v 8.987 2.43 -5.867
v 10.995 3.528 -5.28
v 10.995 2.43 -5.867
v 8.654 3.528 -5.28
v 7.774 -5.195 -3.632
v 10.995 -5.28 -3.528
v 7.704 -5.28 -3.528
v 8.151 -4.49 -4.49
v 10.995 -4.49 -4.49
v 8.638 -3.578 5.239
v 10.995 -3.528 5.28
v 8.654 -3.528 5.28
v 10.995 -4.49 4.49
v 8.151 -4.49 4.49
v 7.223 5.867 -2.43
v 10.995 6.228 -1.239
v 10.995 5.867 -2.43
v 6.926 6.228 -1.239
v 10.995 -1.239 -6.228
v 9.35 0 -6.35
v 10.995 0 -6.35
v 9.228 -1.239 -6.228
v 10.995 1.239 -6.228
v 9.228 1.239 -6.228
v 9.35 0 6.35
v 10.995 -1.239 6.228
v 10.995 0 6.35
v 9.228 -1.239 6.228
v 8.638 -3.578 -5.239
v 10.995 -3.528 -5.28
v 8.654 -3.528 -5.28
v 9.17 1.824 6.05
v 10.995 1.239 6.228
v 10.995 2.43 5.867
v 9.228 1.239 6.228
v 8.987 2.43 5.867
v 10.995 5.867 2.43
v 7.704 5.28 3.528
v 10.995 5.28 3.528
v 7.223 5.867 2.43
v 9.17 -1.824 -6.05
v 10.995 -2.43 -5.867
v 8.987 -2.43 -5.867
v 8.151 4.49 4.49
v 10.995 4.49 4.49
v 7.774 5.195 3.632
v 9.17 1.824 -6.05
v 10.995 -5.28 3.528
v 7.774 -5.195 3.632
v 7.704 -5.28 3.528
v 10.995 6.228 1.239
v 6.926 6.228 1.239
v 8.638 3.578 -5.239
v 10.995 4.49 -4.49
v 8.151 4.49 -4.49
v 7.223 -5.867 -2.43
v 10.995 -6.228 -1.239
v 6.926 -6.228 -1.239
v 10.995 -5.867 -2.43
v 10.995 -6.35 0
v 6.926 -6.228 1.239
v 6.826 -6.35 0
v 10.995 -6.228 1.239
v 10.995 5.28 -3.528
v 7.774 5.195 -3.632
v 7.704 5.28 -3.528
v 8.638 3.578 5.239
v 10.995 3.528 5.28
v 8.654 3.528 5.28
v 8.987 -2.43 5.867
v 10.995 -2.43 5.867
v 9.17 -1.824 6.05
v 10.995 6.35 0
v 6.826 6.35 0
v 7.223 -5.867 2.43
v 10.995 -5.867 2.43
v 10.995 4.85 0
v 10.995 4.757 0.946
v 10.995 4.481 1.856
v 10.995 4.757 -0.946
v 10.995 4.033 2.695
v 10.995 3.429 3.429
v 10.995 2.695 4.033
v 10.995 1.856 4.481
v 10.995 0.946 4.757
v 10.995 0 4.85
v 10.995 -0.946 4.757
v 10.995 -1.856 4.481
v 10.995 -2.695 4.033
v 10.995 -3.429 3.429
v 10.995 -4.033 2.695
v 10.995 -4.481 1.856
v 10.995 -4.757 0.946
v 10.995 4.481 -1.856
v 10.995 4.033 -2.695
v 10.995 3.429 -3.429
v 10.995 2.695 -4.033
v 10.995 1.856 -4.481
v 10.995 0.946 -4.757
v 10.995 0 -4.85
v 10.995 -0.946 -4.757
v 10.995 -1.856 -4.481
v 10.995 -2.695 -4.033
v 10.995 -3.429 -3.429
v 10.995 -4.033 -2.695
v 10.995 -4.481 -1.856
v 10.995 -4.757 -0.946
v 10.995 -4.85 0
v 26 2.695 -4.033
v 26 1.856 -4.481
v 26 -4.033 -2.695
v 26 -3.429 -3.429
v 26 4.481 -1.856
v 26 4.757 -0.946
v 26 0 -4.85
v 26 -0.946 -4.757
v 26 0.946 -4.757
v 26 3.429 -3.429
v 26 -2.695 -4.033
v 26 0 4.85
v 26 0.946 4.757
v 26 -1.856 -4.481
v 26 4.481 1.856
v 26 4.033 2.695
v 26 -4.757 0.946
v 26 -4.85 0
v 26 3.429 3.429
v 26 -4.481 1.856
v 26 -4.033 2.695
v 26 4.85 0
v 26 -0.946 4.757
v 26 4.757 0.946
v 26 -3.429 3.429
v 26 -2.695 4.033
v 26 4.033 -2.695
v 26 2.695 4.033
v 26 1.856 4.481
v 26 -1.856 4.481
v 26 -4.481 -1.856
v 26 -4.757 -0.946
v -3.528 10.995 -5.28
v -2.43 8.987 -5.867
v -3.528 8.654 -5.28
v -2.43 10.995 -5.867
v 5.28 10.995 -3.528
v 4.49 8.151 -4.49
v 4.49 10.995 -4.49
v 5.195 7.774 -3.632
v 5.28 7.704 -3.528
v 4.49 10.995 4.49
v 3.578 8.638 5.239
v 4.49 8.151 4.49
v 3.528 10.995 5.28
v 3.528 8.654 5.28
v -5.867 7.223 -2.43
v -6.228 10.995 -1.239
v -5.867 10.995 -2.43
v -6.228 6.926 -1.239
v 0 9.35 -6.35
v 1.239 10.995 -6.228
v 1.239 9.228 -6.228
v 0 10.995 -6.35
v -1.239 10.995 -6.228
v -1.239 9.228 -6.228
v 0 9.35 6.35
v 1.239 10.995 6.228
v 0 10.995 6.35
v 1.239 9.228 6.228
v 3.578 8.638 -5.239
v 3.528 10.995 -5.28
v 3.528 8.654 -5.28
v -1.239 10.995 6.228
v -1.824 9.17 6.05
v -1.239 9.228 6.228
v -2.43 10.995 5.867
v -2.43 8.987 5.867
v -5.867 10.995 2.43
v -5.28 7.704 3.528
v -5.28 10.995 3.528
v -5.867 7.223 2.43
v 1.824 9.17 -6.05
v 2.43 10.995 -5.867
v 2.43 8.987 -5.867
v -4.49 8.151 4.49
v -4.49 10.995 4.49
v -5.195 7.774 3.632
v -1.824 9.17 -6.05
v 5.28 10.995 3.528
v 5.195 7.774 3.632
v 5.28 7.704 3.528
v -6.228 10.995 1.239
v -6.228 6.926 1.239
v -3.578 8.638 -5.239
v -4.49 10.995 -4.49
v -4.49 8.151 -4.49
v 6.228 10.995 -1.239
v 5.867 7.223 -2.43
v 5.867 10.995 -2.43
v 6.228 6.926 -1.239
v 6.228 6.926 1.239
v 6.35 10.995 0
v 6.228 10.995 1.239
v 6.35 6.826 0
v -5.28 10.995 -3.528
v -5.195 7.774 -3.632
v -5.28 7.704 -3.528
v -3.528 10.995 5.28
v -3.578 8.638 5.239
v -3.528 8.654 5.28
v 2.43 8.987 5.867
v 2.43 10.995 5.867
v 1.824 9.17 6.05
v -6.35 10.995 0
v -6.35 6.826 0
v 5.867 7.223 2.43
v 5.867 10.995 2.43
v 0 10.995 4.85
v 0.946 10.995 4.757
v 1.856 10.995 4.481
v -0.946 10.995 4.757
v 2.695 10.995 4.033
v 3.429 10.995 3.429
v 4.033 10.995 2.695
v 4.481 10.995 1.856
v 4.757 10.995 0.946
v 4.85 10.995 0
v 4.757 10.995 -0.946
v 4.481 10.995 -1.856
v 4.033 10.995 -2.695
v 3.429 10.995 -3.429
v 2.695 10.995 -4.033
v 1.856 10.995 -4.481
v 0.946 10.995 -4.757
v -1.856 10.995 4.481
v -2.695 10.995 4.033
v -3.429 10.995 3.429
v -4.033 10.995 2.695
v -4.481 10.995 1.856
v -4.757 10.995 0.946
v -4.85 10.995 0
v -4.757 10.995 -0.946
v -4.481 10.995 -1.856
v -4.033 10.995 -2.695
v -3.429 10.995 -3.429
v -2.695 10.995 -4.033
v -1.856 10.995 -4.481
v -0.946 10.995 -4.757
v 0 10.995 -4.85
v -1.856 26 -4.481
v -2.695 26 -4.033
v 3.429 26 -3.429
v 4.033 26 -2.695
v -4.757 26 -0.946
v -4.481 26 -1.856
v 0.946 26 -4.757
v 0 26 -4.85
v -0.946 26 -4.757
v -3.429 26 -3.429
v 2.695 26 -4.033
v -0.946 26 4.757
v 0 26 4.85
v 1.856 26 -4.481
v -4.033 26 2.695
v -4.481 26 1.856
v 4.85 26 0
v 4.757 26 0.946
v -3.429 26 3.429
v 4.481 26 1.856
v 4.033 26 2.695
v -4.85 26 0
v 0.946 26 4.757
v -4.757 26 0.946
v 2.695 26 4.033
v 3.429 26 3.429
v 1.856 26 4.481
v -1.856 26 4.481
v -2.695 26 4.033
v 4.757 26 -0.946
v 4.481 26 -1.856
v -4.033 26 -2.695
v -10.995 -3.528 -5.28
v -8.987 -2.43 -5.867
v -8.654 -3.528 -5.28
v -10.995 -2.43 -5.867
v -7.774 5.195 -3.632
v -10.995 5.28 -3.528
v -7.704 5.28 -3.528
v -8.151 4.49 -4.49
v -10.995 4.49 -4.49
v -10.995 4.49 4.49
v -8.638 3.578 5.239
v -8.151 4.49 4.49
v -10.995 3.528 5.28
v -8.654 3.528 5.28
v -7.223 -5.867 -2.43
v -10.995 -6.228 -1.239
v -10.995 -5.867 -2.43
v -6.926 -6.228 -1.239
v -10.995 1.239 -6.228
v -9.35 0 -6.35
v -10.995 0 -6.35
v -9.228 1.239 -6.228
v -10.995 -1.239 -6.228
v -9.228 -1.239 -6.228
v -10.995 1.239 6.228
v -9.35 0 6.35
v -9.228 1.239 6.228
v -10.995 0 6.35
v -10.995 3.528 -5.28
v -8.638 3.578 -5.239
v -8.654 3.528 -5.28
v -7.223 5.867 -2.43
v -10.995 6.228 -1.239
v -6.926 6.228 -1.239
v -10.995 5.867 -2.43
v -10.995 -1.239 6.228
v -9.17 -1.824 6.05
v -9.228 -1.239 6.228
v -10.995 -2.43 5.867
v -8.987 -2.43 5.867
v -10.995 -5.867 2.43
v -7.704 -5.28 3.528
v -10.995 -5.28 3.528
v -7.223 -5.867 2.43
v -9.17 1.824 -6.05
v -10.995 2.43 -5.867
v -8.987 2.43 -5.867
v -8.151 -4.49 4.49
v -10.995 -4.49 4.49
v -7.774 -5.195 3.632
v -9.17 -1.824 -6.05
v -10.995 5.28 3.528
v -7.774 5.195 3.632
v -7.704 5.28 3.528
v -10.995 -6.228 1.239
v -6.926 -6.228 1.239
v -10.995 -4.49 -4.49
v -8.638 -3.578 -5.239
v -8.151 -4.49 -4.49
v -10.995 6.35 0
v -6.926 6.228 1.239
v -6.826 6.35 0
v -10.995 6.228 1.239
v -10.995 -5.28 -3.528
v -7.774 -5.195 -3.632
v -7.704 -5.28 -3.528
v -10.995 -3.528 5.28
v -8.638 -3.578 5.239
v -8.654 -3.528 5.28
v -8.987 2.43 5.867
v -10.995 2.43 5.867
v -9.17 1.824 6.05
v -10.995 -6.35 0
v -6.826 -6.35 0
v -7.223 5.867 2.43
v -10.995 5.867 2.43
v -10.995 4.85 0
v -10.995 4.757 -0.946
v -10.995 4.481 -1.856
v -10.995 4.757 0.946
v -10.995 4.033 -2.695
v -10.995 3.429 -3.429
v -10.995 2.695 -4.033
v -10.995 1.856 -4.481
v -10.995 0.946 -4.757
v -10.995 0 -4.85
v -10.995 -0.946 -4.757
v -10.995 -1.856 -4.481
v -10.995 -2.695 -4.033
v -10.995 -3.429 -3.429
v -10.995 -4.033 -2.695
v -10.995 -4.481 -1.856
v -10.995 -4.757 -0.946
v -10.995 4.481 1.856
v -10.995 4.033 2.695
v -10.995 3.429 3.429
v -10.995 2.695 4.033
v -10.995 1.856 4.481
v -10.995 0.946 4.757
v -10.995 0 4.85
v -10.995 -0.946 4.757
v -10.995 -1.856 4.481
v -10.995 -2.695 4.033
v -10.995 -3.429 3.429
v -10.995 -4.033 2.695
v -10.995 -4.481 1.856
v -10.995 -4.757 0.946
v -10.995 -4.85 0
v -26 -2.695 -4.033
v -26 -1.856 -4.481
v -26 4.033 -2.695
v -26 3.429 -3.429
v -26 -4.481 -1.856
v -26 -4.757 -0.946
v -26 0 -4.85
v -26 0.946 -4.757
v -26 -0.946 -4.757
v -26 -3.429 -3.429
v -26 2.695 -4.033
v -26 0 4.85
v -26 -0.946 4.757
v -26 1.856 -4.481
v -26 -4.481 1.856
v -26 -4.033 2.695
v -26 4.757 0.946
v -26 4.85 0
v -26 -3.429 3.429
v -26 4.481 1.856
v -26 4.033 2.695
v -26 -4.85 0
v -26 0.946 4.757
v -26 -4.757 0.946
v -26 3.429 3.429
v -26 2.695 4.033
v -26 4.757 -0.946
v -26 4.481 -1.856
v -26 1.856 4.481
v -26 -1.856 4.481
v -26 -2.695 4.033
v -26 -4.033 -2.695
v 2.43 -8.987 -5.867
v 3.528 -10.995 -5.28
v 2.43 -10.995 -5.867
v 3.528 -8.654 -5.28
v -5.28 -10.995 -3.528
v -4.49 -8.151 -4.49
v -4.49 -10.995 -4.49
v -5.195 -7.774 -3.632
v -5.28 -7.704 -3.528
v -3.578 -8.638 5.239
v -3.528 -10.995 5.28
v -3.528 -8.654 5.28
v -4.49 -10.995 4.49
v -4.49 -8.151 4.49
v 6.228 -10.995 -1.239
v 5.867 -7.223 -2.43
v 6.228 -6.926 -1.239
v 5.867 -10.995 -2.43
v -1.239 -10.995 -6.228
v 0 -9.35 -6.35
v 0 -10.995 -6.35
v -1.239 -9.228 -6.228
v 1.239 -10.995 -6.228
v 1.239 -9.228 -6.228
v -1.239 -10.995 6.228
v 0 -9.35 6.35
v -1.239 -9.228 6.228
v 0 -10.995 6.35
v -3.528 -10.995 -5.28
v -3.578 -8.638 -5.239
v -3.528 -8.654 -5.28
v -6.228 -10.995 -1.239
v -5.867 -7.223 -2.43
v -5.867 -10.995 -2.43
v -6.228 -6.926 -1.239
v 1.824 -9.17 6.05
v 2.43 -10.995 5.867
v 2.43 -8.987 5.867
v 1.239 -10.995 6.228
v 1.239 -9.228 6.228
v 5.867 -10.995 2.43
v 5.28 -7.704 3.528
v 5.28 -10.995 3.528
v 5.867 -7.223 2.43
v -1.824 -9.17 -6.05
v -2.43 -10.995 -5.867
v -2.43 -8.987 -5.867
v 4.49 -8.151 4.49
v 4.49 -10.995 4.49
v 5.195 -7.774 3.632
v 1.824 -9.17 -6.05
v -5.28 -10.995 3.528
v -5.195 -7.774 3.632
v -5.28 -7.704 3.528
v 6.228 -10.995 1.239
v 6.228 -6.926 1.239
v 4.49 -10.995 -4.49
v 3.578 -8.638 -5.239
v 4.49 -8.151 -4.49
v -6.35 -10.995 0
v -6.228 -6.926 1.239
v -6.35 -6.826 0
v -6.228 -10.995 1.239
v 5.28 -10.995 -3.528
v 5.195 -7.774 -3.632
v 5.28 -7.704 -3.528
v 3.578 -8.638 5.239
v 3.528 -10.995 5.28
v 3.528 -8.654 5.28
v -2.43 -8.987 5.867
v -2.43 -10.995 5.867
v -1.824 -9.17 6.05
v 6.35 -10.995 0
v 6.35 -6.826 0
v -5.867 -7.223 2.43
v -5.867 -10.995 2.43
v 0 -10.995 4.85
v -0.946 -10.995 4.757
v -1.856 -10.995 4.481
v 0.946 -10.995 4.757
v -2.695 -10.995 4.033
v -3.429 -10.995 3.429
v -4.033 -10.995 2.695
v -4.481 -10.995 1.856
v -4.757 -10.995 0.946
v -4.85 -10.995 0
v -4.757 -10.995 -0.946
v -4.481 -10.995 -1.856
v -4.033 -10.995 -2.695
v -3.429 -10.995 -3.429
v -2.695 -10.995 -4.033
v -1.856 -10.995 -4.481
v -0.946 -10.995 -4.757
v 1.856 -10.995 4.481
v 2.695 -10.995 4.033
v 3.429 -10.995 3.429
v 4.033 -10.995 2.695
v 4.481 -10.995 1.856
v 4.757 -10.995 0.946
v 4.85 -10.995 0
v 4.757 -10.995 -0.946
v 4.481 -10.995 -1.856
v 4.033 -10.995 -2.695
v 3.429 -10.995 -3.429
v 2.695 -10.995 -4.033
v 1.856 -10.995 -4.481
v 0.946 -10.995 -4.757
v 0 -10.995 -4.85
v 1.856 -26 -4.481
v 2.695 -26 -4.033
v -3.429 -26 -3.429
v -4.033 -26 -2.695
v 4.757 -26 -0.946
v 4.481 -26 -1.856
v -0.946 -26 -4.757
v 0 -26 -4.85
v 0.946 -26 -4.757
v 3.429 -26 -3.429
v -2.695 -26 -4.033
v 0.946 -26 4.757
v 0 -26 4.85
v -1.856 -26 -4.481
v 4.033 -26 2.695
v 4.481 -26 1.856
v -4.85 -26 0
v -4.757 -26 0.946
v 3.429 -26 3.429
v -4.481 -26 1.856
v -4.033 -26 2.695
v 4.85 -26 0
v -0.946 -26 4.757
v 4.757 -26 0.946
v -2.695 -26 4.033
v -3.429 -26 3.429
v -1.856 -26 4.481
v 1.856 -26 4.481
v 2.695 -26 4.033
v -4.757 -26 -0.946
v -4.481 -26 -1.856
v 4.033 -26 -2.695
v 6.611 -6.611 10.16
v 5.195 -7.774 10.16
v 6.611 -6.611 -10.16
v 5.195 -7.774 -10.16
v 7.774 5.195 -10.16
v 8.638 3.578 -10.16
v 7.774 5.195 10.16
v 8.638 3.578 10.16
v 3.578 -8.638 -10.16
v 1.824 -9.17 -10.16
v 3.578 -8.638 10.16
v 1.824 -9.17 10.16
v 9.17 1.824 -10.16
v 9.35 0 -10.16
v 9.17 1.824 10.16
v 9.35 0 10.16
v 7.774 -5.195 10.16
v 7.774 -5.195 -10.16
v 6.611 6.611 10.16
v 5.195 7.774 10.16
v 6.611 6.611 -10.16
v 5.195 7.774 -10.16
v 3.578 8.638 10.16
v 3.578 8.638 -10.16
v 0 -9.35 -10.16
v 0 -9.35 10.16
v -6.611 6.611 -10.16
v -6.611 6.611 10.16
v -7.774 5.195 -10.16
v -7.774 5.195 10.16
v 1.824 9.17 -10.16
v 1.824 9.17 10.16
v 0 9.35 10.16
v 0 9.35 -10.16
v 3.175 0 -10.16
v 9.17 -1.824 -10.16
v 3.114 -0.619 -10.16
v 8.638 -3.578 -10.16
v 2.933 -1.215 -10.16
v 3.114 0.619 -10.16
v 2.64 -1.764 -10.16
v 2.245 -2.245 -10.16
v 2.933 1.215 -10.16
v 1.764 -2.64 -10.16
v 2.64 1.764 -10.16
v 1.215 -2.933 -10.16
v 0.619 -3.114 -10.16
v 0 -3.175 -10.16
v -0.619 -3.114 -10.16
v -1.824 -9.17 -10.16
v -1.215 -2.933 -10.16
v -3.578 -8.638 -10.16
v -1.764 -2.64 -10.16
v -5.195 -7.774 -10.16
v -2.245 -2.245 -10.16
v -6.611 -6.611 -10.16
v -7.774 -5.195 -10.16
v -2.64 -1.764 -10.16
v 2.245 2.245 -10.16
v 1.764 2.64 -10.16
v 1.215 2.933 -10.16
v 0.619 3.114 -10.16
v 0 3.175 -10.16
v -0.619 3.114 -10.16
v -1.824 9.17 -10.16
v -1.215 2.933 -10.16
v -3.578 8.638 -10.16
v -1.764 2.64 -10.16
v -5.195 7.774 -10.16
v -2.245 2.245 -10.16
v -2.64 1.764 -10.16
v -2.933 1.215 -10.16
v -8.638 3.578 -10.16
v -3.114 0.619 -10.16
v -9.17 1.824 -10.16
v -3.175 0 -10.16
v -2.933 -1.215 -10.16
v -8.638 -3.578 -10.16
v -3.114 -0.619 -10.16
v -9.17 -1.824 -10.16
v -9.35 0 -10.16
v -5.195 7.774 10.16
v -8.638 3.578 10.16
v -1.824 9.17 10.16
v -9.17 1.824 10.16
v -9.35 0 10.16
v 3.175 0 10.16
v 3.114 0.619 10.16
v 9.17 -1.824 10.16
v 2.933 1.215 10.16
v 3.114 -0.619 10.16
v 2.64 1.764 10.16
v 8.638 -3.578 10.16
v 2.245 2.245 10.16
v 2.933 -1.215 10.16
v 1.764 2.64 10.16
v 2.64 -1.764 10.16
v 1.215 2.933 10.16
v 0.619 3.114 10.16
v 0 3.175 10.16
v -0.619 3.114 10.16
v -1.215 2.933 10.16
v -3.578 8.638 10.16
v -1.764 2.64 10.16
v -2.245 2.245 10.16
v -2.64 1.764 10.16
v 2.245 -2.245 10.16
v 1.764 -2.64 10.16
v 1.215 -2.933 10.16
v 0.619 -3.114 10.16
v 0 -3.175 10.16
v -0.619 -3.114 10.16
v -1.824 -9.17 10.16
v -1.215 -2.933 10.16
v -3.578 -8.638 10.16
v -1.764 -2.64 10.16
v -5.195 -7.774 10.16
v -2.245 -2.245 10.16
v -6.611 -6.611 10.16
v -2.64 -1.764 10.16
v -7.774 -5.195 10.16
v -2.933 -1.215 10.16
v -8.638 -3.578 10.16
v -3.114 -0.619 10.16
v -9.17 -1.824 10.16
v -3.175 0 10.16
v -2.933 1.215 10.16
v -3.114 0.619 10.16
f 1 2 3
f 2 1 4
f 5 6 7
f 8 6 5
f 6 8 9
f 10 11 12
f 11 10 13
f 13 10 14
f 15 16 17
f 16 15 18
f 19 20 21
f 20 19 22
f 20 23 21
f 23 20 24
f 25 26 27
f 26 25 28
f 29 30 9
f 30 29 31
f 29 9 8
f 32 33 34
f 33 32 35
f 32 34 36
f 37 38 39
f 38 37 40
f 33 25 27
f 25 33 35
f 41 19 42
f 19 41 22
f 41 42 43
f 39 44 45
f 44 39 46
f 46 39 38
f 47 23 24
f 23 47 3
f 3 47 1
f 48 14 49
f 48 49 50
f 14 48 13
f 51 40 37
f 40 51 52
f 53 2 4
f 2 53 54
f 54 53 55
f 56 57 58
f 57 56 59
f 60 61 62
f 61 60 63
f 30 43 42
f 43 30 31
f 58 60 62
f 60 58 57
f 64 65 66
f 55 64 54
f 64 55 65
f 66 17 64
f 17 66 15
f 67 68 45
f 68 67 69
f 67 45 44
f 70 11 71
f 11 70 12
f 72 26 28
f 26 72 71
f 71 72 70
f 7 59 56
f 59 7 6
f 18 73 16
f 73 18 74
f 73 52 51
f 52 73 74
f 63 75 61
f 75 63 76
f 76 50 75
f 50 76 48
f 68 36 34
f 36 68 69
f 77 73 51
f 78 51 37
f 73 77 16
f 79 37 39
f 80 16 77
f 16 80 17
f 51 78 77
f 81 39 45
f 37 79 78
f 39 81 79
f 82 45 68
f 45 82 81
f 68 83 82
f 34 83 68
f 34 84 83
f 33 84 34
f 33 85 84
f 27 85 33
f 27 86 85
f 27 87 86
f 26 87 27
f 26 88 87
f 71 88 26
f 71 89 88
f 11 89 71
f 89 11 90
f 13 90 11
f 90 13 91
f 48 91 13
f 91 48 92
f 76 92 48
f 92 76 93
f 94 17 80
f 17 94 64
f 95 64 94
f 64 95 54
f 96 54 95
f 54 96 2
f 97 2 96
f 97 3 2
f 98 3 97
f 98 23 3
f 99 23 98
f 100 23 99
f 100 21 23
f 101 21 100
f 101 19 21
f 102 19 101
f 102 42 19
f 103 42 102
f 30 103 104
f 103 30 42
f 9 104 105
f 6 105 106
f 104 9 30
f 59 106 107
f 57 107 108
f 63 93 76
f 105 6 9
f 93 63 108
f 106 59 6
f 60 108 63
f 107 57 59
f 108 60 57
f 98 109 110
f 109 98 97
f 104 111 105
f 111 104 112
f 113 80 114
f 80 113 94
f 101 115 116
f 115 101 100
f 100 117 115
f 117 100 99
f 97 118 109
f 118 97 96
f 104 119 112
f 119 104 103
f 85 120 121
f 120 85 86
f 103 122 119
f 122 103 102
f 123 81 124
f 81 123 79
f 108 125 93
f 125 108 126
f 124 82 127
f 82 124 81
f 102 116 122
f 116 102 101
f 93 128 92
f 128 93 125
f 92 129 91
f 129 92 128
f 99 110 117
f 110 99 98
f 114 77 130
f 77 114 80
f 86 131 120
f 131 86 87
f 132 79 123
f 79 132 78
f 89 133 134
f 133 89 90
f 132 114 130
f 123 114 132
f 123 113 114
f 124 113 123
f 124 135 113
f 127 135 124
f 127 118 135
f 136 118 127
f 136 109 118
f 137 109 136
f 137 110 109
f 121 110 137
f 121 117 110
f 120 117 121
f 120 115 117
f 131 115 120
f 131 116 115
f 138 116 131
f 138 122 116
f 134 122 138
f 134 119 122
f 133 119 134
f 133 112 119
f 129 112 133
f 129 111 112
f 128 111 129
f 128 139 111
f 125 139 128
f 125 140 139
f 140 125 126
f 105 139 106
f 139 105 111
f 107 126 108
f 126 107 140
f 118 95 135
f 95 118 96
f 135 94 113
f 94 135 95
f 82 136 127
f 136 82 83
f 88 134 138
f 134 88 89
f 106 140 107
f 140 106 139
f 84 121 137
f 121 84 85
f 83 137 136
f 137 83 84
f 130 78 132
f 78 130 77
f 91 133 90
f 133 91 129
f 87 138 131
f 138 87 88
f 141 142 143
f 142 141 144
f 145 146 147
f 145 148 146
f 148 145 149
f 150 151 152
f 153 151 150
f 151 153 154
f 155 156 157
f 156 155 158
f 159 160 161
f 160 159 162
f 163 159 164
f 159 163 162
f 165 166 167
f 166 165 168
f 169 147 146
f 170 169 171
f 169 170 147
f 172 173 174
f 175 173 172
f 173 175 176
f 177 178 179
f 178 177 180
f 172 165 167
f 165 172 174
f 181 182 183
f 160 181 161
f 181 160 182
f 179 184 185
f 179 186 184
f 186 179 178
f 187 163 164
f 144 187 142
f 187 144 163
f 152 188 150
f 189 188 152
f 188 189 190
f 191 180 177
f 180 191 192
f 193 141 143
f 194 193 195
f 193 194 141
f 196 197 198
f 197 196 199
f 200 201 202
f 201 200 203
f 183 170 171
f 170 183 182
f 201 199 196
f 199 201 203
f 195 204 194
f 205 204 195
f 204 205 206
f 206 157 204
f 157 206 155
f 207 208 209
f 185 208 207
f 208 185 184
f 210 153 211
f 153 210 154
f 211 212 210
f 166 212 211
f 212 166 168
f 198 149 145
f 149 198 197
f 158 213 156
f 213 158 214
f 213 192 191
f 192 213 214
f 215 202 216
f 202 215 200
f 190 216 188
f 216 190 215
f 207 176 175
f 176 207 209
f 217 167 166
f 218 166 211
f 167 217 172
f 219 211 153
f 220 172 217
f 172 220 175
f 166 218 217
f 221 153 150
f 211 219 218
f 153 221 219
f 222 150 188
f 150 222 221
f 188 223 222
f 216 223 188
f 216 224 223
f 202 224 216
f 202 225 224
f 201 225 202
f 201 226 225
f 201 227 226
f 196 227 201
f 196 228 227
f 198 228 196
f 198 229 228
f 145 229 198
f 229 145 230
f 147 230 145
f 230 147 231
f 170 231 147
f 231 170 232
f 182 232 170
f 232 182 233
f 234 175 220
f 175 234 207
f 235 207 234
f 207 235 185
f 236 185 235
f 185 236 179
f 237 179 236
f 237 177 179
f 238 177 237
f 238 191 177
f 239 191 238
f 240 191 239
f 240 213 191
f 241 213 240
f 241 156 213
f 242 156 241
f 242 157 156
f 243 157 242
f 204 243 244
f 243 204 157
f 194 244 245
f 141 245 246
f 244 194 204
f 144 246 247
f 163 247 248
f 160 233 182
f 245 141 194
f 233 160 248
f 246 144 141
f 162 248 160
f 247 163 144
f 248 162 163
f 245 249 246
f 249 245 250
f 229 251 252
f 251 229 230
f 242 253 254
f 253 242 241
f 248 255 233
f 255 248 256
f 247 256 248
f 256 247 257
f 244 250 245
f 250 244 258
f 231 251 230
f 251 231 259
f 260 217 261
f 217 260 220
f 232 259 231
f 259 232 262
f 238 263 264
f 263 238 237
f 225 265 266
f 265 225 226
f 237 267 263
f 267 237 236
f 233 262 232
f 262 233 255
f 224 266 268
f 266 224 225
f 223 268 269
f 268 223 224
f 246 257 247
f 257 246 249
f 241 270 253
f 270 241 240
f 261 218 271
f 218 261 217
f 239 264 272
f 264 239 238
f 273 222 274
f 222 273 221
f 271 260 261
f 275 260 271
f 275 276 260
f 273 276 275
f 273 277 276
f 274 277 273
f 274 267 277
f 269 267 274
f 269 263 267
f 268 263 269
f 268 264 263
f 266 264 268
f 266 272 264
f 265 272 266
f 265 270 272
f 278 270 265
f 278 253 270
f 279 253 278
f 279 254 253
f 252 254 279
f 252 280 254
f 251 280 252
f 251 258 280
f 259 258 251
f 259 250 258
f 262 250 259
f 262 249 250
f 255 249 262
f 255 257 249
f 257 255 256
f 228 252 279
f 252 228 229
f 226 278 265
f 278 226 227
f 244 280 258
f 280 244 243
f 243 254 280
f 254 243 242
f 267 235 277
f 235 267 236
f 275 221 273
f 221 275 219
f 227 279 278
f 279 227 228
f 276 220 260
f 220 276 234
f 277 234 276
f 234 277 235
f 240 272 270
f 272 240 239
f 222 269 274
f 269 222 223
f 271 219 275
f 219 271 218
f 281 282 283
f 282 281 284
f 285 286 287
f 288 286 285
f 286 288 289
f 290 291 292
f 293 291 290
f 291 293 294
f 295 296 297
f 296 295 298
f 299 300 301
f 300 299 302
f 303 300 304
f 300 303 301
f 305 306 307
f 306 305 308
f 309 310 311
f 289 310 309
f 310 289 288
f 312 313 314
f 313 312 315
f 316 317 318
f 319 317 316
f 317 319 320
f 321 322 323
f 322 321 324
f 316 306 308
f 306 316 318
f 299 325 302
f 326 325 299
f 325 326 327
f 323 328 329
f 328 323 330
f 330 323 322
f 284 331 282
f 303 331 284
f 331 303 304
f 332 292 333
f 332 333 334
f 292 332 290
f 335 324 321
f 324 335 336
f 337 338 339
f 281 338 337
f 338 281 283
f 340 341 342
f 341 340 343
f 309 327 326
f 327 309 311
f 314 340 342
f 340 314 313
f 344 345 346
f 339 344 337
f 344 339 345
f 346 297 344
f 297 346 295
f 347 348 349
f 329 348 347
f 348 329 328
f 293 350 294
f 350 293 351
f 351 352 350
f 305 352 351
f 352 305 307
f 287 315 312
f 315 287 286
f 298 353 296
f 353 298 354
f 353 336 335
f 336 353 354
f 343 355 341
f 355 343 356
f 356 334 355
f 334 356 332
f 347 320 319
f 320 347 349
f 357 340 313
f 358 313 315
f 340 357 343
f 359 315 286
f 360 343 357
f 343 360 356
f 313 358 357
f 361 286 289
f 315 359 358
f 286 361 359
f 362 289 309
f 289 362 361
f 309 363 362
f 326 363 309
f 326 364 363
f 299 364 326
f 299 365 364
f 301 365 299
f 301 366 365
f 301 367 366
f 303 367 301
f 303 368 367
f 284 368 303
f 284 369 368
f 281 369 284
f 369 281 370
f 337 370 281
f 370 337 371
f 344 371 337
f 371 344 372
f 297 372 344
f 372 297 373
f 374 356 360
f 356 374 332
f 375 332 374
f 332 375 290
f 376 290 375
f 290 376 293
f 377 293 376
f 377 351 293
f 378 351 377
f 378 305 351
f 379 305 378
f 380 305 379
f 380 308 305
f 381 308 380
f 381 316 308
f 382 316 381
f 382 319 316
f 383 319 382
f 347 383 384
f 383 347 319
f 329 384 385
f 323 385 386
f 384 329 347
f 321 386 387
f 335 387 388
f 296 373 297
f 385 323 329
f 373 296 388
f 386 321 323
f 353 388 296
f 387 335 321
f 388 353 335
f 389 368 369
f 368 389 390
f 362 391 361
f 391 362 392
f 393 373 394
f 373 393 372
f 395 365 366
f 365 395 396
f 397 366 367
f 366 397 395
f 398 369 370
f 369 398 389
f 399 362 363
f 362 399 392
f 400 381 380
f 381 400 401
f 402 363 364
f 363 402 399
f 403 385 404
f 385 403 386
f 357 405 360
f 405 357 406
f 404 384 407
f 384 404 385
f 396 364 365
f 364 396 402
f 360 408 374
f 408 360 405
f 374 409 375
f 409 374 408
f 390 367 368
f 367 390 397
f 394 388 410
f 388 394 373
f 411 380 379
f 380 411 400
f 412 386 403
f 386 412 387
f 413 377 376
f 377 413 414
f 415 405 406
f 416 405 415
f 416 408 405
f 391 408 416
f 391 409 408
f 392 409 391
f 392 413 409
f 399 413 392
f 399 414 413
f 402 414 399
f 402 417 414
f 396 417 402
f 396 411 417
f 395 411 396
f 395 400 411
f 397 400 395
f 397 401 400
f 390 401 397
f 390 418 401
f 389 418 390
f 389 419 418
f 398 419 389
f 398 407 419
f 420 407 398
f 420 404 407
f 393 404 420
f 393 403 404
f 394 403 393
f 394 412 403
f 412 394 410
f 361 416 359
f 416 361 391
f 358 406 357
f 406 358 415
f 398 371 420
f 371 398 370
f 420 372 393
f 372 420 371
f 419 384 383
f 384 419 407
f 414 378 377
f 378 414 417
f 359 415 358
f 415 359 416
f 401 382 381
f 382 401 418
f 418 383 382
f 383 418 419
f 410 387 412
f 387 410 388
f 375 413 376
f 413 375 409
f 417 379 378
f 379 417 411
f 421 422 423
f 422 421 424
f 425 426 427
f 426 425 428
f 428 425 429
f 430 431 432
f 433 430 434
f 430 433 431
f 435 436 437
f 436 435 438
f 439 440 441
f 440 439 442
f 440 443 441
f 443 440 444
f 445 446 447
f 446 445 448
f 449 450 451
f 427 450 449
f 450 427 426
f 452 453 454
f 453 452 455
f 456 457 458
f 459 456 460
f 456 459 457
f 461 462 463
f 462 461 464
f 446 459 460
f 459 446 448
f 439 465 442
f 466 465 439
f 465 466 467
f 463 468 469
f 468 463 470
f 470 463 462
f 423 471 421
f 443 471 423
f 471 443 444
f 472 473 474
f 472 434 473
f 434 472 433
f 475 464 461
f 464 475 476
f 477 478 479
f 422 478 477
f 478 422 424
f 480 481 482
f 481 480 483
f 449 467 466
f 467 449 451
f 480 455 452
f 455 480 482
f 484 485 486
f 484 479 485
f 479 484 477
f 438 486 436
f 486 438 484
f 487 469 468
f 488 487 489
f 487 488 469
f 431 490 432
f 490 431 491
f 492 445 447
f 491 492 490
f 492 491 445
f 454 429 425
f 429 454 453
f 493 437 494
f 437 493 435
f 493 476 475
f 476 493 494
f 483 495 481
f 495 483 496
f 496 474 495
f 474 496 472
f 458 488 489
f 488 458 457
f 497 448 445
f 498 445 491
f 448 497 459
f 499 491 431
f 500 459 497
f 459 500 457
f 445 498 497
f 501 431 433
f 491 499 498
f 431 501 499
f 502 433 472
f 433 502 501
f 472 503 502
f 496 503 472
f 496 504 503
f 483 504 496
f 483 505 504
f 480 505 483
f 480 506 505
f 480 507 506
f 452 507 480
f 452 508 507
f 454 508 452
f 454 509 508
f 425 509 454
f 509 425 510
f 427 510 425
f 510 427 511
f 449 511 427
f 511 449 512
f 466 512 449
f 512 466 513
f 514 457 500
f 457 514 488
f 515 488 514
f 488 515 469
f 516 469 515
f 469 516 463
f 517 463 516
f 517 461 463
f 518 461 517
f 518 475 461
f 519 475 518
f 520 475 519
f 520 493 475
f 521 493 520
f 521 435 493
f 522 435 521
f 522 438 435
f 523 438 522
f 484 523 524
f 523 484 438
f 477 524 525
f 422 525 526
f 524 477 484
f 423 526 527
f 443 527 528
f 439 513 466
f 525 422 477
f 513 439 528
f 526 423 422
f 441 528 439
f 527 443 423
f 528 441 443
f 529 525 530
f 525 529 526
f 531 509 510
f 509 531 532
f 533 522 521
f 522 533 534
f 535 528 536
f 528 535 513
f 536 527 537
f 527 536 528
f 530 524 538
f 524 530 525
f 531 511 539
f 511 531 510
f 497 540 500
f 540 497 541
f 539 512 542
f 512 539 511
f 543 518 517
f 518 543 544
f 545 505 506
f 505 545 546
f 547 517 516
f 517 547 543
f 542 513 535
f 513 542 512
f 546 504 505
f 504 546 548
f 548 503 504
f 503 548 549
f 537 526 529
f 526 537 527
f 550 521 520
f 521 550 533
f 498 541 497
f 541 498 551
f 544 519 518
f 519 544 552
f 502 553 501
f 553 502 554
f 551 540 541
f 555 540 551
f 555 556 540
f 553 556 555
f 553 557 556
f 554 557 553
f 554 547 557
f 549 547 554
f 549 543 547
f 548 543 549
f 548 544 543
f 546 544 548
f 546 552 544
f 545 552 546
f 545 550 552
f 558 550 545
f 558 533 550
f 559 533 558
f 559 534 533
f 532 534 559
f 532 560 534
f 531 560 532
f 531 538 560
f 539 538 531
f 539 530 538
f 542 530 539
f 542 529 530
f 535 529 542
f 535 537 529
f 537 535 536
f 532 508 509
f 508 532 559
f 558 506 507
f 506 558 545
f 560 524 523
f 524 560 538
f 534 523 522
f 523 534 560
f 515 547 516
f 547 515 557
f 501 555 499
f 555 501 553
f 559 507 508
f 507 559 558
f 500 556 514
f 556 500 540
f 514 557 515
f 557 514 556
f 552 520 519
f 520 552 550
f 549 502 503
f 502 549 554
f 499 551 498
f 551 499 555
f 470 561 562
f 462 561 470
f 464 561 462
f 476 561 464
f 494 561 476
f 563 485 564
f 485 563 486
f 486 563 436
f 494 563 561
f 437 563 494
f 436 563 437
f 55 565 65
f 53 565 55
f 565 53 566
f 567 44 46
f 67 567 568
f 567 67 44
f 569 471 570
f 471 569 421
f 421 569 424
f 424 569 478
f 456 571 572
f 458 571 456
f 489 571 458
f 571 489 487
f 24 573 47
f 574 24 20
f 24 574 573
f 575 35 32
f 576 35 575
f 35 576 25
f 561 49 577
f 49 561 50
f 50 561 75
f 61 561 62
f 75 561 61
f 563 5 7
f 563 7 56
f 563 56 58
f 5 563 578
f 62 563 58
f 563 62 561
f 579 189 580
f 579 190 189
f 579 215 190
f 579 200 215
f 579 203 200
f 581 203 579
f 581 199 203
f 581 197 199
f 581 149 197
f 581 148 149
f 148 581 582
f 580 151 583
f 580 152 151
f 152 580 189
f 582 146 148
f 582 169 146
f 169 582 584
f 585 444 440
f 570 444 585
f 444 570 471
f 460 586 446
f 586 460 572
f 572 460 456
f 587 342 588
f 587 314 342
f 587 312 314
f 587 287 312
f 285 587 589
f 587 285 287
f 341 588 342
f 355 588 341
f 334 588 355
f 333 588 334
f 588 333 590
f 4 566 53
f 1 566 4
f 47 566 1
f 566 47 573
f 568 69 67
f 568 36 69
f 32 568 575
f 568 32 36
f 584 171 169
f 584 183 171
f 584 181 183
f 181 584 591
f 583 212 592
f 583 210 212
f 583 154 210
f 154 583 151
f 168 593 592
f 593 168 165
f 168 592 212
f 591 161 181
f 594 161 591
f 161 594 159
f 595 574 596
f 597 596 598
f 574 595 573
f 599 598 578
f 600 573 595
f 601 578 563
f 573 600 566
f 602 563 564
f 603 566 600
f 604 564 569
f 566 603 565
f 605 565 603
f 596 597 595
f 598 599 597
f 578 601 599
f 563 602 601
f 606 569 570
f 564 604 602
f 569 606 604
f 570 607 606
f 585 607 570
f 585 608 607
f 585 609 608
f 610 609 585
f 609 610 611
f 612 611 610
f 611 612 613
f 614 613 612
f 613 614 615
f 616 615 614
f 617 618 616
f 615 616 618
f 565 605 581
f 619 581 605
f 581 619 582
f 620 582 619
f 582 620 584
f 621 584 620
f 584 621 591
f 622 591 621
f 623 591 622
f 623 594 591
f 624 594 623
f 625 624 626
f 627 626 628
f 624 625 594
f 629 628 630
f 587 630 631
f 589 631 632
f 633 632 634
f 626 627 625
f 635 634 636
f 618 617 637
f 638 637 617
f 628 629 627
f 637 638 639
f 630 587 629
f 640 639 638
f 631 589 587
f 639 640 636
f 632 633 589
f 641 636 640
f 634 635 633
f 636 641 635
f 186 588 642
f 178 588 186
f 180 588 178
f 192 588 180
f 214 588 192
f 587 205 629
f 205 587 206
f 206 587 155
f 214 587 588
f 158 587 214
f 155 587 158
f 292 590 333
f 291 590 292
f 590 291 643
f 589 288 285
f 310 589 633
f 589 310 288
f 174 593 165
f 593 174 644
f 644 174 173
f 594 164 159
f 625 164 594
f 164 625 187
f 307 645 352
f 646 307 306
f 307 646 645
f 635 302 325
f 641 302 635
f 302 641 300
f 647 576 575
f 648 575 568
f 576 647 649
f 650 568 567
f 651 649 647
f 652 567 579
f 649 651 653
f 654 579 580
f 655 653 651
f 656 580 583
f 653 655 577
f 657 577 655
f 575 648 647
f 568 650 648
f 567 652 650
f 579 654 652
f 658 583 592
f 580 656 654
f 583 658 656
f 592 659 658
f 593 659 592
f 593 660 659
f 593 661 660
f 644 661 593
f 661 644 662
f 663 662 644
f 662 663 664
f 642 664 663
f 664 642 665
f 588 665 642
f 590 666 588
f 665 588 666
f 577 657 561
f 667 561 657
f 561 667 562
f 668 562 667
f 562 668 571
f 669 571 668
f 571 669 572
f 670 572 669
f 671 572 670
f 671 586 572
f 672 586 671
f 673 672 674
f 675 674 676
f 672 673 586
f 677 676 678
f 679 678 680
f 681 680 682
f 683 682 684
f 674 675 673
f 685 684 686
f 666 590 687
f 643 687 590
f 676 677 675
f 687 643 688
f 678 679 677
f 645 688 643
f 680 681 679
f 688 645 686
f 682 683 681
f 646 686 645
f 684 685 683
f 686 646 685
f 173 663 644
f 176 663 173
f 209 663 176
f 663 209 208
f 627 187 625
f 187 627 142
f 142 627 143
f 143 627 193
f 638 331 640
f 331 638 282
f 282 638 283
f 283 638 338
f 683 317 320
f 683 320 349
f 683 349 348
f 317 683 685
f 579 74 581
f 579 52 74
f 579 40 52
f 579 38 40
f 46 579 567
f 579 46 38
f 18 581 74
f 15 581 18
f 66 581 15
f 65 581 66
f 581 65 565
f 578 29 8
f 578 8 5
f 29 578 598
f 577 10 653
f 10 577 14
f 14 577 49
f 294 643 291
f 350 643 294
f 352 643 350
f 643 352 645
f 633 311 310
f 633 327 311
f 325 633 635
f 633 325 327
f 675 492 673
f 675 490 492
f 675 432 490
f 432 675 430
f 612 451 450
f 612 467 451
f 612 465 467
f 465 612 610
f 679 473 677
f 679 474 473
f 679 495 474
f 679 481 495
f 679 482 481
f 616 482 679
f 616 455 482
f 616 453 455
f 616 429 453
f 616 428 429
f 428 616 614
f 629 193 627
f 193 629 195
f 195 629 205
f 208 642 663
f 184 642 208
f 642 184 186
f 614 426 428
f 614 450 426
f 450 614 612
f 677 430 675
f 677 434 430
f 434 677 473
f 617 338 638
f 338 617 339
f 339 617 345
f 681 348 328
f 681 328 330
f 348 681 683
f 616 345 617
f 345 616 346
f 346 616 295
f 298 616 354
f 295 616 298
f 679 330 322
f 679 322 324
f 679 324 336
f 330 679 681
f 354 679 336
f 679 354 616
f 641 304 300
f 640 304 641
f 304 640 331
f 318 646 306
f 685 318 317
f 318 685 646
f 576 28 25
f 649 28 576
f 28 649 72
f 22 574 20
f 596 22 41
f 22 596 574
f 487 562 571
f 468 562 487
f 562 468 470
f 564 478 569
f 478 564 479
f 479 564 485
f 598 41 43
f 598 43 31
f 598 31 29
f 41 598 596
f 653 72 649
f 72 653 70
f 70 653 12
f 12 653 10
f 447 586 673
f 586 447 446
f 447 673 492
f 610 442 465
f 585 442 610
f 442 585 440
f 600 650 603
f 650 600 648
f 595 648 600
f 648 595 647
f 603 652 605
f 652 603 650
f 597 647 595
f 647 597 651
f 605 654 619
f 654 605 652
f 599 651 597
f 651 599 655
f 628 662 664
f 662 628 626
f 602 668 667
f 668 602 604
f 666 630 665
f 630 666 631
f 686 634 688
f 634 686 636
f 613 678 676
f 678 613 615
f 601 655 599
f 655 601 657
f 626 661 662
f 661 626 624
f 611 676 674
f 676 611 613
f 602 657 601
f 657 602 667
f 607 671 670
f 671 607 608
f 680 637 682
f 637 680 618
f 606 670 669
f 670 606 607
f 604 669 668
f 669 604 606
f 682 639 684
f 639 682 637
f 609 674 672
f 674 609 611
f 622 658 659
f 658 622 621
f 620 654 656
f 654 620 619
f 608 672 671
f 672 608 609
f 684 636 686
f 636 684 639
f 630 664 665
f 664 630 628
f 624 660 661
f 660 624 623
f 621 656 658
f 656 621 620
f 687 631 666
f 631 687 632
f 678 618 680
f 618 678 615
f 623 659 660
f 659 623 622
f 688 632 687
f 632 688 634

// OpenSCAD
$fn = 32;

// ----------------------------------------------------------------------
// Cardan cross: 52 mm span, 12.7 mm trunnions
// ----------------------------------------------------------------------

// --- parameters (mm) ---
journal_d = 12.7;         // trunnion diameter
arm_len = 26;             // trunnion length from the centre
step_r = 4.32;            // step position from the centre
step_d = 9.7;             // journal diameter after the step
hub_d = 18.7;             // hub diameter
hub_h = 20.32;            // hub height
bore_d = 6.35;            // hub bore

difference() {
  union() {
    /* hub along the joint axis */
    cylinder(h = hub_h, d = hub_d, center = true);
    for (a = [0 : 90 : 270]) rotate([0, 0, a]) {
      /* trunnion, sunk into the hub */
      translate([hub_d / 4, 0, 0]) rotate([0, 90, 0]) cylinder(h = step_r + 2, d = journal_d);
      /* stepped journal out to the tip */
      translate([step_r - 0.5, 0, 0]) rotate([0, 90, 0]) cylinder(h = arm_len + 0.5 - step_r, d = step_d);
    }
  }
  /* lubrication bore through the hub, 2.5 mm clear on both sides */
  translate([0, 0, -hub_h / 2 - 2.5]) cylinder(h = hub_h + 5, d = bore_d);
}
